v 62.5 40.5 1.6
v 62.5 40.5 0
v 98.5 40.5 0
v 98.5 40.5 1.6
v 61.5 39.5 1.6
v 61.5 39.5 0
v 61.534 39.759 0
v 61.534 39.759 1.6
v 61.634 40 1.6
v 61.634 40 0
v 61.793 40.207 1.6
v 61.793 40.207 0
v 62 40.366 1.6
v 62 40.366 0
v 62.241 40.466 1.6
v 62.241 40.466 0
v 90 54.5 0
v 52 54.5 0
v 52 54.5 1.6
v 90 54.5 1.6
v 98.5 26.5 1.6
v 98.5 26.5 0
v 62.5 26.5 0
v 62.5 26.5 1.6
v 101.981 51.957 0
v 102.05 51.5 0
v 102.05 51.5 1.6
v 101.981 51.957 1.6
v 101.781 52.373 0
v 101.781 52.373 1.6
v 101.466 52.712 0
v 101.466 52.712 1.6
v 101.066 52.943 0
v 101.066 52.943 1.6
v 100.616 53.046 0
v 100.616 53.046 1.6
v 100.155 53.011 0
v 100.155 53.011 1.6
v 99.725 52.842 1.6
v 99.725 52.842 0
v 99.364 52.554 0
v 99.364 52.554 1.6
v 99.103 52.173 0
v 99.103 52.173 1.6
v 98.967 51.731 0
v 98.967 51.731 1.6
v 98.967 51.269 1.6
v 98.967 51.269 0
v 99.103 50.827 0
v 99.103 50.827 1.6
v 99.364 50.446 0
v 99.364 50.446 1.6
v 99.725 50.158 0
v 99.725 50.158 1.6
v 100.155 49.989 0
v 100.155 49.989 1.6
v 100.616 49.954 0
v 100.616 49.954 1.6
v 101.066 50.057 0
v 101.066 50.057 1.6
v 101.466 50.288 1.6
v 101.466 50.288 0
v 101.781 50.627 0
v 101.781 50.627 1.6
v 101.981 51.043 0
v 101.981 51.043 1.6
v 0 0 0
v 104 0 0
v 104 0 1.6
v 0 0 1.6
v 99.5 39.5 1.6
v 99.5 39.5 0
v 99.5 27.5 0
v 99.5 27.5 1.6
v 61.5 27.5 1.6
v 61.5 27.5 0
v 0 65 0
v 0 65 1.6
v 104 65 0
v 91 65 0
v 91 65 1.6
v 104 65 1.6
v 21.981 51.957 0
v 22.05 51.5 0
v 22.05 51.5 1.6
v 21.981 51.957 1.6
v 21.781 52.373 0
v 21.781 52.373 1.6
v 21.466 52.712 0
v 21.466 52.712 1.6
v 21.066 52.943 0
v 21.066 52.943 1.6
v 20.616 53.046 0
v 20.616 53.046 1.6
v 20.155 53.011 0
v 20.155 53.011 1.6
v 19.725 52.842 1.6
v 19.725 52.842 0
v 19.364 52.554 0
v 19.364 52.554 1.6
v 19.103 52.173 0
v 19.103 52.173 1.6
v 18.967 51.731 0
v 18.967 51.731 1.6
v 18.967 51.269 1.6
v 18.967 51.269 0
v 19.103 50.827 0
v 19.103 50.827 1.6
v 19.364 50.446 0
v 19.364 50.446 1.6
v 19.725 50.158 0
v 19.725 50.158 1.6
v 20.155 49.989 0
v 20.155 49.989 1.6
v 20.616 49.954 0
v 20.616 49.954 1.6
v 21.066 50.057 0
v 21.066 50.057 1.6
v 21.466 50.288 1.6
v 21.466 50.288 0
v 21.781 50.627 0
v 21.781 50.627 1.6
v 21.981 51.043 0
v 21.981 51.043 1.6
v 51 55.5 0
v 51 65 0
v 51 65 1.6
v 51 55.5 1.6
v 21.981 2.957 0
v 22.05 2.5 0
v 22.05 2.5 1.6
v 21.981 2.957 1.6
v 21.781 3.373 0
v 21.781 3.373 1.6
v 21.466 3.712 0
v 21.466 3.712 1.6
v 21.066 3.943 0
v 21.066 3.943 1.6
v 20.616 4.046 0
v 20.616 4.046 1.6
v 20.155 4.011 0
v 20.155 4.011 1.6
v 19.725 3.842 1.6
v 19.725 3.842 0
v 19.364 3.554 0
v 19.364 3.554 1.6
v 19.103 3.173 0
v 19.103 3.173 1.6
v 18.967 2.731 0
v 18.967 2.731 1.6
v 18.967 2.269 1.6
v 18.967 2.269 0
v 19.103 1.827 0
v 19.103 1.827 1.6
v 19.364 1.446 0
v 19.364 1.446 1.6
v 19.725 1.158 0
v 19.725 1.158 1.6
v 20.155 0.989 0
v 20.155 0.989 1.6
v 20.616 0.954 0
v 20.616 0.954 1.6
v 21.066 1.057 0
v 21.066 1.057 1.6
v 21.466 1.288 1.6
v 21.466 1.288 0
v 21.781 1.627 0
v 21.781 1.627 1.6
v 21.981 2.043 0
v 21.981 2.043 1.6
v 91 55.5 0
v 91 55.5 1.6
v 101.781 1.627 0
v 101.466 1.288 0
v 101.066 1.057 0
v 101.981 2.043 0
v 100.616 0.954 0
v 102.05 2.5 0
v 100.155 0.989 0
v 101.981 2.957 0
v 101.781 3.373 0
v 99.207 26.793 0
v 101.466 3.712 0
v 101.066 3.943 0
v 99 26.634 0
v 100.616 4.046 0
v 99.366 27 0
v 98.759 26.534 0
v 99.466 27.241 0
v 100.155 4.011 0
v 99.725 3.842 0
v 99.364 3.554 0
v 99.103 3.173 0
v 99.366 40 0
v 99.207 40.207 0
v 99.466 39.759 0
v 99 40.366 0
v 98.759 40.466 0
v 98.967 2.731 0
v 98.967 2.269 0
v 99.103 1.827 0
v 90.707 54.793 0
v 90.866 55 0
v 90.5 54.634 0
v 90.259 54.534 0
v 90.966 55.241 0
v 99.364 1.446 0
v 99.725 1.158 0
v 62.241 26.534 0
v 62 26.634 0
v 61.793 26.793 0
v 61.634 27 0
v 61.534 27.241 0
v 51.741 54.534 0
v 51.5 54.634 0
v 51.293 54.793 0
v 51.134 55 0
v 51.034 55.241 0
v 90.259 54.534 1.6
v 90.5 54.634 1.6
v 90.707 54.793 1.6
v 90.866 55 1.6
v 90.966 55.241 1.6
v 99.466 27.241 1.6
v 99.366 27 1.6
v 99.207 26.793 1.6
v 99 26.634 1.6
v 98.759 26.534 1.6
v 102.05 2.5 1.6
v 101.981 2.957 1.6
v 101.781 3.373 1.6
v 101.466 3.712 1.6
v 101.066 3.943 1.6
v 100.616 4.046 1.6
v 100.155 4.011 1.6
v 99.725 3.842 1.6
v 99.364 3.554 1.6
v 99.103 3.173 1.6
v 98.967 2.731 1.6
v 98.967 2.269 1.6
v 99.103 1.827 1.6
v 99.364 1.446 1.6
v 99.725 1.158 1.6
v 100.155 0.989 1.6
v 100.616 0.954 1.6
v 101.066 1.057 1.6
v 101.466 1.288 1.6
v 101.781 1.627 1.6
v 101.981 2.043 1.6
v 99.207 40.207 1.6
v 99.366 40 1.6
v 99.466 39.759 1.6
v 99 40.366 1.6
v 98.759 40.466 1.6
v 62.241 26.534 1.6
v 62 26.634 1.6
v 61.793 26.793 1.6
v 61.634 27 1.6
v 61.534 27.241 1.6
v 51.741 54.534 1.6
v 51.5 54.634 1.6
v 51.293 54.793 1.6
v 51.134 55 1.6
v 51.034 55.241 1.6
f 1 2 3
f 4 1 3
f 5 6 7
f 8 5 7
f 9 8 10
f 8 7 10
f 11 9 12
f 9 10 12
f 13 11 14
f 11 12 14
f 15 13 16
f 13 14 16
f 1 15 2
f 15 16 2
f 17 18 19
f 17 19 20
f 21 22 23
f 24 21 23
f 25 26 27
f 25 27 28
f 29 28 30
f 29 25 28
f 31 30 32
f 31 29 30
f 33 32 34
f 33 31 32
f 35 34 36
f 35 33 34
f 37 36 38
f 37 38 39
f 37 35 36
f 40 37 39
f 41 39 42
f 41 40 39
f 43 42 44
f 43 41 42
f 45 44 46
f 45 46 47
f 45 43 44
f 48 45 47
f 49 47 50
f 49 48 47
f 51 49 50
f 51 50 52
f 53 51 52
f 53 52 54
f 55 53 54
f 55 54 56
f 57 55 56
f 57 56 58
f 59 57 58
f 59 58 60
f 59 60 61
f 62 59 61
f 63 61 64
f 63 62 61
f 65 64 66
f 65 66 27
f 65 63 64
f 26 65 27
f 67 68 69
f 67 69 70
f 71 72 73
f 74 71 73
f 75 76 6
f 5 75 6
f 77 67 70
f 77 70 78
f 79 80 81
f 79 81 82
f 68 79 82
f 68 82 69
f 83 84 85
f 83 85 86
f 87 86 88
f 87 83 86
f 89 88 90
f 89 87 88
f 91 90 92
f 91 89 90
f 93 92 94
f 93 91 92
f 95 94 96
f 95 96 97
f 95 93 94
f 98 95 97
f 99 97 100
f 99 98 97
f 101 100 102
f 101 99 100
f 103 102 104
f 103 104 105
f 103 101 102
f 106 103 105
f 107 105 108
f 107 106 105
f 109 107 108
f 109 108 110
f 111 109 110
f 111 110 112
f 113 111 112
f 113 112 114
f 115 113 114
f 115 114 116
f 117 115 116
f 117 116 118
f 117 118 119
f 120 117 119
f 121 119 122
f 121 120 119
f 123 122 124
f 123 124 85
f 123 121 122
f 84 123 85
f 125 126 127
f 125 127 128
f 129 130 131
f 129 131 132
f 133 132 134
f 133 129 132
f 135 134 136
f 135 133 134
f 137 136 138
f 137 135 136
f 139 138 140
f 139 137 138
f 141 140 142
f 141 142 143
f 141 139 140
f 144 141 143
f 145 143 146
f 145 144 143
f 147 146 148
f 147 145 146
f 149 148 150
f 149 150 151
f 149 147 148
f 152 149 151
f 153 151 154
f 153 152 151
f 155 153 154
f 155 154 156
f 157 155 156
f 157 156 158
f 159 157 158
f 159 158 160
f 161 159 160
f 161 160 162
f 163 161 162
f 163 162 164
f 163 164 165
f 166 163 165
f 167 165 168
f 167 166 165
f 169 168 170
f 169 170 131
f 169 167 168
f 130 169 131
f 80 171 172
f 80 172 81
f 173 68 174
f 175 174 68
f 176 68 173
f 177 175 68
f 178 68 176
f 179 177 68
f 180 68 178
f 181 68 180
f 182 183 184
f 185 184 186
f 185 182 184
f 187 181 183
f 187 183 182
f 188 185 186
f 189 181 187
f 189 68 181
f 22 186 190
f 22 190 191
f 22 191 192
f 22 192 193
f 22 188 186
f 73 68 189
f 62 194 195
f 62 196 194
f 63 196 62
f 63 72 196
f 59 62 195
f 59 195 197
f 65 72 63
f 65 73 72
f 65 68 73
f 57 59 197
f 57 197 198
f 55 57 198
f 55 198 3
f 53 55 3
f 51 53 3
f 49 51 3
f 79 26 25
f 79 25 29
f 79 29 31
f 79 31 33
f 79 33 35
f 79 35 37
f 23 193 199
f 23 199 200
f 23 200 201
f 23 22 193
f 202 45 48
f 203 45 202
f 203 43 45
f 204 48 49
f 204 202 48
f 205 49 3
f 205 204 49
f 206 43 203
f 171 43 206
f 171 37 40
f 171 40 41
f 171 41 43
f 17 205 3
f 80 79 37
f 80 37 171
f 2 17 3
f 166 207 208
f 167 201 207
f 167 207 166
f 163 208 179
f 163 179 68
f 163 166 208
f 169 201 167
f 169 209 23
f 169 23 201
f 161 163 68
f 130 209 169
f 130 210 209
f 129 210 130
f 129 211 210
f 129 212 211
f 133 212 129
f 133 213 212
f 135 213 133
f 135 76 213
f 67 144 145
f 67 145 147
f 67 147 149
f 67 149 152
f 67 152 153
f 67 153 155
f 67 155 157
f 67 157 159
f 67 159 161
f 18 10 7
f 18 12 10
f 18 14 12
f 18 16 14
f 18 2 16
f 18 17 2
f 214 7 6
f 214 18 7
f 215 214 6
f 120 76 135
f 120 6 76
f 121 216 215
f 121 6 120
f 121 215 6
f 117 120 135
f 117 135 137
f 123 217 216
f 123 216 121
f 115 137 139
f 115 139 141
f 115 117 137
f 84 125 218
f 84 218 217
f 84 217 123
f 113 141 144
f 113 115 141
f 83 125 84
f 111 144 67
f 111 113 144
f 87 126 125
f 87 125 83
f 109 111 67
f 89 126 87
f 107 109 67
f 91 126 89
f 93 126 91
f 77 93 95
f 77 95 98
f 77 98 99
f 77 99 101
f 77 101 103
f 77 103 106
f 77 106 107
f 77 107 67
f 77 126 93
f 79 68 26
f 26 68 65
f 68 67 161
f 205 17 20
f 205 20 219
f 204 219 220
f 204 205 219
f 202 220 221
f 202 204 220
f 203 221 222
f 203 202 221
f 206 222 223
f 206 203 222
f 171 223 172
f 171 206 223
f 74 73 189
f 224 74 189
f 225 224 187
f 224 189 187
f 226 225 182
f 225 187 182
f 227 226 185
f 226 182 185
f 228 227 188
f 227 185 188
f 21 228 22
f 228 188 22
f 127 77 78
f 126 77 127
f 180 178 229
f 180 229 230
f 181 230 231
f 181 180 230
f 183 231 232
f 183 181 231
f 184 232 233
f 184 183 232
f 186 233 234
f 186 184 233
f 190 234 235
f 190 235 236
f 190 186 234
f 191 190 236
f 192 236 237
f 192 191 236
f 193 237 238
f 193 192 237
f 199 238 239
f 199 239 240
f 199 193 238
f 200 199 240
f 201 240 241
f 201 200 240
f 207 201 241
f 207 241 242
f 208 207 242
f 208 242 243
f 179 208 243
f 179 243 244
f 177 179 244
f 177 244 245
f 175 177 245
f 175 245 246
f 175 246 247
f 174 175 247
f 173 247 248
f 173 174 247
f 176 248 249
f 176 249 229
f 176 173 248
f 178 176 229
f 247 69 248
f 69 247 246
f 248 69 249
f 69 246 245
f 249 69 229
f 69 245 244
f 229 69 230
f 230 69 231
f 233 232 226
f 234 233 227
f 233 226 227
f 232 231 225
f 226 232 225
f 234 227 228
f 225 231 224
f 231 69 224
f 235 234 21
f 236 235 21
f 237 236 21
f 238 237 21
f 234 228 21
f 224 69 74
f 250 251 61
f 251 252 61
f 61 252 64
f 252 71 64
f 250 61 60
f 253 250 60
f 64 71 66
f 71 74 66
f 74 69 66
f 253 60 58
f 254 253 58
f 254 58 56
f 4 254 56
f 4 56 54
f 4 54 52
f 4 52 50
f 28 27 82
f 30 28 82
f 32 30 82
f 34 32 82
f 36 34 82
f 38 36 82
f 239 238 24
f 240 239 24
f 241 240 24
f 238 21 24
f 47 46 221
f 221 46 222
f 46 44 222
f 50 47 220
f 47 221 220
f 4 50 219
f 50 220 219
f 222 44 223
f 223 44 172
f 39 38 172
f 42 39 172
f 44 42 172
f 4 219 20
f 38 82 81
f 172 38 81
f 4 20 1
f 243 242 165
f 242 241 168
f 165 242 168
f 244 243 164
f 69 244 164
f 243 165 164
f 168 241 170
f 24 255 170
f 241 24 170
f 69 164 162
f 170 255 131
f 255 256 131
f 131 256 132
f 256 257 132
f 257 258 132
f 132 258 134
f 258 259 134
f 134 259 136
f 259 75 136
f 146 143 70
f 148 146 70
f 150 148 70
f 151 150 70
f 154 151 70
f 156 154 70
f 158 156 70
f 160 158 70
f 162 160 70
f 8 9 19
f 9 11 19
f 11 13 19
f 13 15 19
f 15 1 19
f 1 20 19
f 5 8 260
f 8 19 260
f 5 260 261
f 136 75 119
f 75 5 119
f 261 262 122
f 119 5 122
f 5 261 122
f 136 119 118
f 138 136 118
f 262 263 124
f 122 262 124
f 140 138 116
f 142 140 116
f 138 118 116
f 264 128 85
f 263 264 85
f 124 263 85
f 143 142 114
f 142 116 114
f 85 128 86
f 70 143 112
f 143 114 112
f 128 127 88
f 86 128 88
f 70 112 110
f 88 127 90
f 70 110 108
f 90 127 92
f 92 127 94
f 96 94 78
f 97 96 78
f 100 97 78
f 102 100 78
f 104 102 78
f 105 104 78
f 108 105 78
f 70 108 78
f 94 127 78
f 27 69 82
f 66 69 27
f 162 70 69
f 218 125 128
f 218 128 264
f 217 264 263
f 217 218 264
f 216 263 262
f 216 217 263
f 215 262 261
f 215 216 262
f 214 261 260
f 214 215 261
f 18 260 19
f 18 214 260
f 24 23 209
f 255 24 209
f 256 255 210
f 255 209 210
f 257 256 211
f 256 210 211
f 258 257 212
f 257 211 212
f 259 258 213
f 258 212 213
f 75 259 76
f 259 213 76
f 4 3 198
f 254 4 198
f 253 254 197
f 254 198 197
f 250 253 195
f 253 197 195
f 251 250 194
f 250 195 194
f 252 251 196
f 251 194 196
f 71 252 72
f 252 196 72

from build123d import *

# Parameters (mm, degrees)
SKETCH_1_R      = 1.55
EXTRUDE_1_DEPTH = 1.6


with BuildPart() as part:
    # Эскиз1 → Бобышка-Вытянуть1 (new body)
    with BuildSketch(Plane.XY):
        with BuildLine():
            Line((0, 65), (51, 65))
            Line((51, 65), (51, 55.5))
            ThreePointArc((51, 55.5), (51.292893219, 54.792893219), (52, 54.5))
            Line((52, 54.5), (90, 54.5))
            ThreePointArc((90, 54.5), (90.707106781, 54.792893219), (91, 55.5))
            Line((91, 55.5), (91, 65))
            Line((91, 65), (104, 65))
            Line((104, 65), (104, 0))
            Line((104, 0), (0, 0))
            Line((0, 0), (0, 65))
        make_face()
        with Locations((20.5, 51.5)):
            Circle(SKETCH_1_R, mode=Mode.SUBTRACT)
        with Locations((100.5, 51.5)):
            Circle(SKETCH_1_R, mode=Mode.SUBTRACT)
        with Locations((100.5, 2.5)):
            Circle(SKETCH_1_R, mode=Mode.SUBTRACT)
        with Locations((20.5, 2.5)):
            Circle(SKETCH_1_R, mode=Mode.SUBTRACT)
        with BuildLine():
            Line((62.5, 40.5), (98.5, 40.5))
            ThreePointArc((98.5, 40.5), (99.207106781, 40.207106781), (99.5, 39.5))
            Line((99.5, 39.5), (99.5, 27.5))
            ThreePointArc((99.5, 27.5), (99.207106781, 26.792893219), (98.5, 26.5))
            Line((98.5, 26.5), (62.5, 26.5))
            ThreePointArc((62.5, 26.5), (61.792893219, 26.792893219), (61.5, 27.5))
            Line((61.5, 27.5), (61.5, 39.5))
            ThreePointArc((61.5, 39.5), (61.792893219, 40.207106781), (62.5, 40.5))
        make_face(mode=Mode.SUBTRACT)
    extrude(amount=EXTRUDE_1_DEPTH)


solid = part.part
